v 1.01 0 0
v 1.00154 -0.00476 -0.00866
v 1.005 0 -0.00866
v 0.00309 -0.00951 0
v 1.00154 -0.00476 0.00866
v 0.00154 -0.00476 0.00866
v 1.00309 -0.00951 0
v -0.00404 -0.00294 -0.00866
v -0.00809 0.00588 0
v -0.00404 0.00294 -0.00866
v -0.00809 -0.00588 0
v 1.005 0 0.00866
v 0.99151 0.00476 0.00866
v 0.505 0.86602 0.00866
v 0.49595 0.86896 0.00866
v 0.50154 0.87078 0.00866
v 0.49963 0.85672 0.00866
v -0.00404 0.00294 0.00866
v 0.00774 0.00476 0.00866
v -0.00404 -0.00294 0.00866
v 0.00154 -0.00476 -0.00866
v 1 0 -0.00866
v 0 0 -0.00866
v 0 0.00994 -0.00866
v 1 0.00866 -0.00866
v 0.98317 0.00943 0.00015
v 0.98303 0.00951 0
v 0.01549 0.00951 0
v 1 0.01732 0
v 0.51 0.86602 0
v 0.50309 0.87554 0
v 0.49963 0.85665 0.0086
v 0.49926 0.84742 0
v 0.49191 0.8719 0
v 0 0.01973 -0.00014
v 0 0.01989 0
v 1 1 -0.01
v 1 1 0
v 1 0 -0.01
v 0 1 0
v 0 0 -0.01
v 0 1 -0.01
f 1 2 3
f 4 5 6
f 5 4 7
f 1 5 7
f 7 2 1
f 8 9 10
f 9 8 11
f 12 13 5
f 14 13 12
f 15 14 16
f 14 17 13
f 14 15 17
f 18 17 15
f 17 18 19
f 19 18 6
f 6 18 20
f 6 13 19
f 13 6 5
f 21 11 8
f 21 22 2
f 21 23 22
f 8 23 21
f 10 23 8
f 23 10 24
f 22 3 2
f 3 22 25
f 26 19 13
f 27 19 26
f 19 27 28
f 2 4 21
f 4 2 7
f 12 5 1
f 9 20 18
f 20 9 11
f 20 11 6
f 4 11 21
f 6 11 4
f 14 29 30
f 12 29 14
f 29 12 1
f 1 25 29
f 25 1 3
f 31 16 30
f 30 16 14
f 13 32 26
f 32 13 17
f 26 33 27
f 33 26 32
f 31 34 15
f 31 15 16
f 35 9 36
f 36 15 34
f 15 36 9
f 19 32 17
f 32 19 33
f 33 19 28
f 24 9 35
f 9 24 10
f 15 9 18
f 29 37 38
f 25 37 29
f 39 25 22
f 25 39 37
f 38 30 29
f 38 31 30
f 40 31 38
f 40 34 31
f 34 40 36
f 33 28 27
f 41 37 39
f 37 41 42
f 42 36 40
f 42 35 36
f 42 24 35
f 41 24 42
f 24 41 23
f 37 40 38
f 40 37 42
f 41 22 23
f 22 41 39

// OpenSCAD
hull(){
    translate([0, 0]) sphere(0.01);
    translate([1, 0]) sphere(0.01);
}
hull(){
    translate([1, 0]) sphere(0.01);
    translate([0.5, 0.8660254038]) sphere(0.01);
}
hull(){
    translate([0.5, 0.8660254038]) sphere(0.01);
    translate([0, 0]) sphere(0.01);
}
translate([0,0,-0.01]) color([0.1,0.1,0.1]) cube([1,1,0.01]);
